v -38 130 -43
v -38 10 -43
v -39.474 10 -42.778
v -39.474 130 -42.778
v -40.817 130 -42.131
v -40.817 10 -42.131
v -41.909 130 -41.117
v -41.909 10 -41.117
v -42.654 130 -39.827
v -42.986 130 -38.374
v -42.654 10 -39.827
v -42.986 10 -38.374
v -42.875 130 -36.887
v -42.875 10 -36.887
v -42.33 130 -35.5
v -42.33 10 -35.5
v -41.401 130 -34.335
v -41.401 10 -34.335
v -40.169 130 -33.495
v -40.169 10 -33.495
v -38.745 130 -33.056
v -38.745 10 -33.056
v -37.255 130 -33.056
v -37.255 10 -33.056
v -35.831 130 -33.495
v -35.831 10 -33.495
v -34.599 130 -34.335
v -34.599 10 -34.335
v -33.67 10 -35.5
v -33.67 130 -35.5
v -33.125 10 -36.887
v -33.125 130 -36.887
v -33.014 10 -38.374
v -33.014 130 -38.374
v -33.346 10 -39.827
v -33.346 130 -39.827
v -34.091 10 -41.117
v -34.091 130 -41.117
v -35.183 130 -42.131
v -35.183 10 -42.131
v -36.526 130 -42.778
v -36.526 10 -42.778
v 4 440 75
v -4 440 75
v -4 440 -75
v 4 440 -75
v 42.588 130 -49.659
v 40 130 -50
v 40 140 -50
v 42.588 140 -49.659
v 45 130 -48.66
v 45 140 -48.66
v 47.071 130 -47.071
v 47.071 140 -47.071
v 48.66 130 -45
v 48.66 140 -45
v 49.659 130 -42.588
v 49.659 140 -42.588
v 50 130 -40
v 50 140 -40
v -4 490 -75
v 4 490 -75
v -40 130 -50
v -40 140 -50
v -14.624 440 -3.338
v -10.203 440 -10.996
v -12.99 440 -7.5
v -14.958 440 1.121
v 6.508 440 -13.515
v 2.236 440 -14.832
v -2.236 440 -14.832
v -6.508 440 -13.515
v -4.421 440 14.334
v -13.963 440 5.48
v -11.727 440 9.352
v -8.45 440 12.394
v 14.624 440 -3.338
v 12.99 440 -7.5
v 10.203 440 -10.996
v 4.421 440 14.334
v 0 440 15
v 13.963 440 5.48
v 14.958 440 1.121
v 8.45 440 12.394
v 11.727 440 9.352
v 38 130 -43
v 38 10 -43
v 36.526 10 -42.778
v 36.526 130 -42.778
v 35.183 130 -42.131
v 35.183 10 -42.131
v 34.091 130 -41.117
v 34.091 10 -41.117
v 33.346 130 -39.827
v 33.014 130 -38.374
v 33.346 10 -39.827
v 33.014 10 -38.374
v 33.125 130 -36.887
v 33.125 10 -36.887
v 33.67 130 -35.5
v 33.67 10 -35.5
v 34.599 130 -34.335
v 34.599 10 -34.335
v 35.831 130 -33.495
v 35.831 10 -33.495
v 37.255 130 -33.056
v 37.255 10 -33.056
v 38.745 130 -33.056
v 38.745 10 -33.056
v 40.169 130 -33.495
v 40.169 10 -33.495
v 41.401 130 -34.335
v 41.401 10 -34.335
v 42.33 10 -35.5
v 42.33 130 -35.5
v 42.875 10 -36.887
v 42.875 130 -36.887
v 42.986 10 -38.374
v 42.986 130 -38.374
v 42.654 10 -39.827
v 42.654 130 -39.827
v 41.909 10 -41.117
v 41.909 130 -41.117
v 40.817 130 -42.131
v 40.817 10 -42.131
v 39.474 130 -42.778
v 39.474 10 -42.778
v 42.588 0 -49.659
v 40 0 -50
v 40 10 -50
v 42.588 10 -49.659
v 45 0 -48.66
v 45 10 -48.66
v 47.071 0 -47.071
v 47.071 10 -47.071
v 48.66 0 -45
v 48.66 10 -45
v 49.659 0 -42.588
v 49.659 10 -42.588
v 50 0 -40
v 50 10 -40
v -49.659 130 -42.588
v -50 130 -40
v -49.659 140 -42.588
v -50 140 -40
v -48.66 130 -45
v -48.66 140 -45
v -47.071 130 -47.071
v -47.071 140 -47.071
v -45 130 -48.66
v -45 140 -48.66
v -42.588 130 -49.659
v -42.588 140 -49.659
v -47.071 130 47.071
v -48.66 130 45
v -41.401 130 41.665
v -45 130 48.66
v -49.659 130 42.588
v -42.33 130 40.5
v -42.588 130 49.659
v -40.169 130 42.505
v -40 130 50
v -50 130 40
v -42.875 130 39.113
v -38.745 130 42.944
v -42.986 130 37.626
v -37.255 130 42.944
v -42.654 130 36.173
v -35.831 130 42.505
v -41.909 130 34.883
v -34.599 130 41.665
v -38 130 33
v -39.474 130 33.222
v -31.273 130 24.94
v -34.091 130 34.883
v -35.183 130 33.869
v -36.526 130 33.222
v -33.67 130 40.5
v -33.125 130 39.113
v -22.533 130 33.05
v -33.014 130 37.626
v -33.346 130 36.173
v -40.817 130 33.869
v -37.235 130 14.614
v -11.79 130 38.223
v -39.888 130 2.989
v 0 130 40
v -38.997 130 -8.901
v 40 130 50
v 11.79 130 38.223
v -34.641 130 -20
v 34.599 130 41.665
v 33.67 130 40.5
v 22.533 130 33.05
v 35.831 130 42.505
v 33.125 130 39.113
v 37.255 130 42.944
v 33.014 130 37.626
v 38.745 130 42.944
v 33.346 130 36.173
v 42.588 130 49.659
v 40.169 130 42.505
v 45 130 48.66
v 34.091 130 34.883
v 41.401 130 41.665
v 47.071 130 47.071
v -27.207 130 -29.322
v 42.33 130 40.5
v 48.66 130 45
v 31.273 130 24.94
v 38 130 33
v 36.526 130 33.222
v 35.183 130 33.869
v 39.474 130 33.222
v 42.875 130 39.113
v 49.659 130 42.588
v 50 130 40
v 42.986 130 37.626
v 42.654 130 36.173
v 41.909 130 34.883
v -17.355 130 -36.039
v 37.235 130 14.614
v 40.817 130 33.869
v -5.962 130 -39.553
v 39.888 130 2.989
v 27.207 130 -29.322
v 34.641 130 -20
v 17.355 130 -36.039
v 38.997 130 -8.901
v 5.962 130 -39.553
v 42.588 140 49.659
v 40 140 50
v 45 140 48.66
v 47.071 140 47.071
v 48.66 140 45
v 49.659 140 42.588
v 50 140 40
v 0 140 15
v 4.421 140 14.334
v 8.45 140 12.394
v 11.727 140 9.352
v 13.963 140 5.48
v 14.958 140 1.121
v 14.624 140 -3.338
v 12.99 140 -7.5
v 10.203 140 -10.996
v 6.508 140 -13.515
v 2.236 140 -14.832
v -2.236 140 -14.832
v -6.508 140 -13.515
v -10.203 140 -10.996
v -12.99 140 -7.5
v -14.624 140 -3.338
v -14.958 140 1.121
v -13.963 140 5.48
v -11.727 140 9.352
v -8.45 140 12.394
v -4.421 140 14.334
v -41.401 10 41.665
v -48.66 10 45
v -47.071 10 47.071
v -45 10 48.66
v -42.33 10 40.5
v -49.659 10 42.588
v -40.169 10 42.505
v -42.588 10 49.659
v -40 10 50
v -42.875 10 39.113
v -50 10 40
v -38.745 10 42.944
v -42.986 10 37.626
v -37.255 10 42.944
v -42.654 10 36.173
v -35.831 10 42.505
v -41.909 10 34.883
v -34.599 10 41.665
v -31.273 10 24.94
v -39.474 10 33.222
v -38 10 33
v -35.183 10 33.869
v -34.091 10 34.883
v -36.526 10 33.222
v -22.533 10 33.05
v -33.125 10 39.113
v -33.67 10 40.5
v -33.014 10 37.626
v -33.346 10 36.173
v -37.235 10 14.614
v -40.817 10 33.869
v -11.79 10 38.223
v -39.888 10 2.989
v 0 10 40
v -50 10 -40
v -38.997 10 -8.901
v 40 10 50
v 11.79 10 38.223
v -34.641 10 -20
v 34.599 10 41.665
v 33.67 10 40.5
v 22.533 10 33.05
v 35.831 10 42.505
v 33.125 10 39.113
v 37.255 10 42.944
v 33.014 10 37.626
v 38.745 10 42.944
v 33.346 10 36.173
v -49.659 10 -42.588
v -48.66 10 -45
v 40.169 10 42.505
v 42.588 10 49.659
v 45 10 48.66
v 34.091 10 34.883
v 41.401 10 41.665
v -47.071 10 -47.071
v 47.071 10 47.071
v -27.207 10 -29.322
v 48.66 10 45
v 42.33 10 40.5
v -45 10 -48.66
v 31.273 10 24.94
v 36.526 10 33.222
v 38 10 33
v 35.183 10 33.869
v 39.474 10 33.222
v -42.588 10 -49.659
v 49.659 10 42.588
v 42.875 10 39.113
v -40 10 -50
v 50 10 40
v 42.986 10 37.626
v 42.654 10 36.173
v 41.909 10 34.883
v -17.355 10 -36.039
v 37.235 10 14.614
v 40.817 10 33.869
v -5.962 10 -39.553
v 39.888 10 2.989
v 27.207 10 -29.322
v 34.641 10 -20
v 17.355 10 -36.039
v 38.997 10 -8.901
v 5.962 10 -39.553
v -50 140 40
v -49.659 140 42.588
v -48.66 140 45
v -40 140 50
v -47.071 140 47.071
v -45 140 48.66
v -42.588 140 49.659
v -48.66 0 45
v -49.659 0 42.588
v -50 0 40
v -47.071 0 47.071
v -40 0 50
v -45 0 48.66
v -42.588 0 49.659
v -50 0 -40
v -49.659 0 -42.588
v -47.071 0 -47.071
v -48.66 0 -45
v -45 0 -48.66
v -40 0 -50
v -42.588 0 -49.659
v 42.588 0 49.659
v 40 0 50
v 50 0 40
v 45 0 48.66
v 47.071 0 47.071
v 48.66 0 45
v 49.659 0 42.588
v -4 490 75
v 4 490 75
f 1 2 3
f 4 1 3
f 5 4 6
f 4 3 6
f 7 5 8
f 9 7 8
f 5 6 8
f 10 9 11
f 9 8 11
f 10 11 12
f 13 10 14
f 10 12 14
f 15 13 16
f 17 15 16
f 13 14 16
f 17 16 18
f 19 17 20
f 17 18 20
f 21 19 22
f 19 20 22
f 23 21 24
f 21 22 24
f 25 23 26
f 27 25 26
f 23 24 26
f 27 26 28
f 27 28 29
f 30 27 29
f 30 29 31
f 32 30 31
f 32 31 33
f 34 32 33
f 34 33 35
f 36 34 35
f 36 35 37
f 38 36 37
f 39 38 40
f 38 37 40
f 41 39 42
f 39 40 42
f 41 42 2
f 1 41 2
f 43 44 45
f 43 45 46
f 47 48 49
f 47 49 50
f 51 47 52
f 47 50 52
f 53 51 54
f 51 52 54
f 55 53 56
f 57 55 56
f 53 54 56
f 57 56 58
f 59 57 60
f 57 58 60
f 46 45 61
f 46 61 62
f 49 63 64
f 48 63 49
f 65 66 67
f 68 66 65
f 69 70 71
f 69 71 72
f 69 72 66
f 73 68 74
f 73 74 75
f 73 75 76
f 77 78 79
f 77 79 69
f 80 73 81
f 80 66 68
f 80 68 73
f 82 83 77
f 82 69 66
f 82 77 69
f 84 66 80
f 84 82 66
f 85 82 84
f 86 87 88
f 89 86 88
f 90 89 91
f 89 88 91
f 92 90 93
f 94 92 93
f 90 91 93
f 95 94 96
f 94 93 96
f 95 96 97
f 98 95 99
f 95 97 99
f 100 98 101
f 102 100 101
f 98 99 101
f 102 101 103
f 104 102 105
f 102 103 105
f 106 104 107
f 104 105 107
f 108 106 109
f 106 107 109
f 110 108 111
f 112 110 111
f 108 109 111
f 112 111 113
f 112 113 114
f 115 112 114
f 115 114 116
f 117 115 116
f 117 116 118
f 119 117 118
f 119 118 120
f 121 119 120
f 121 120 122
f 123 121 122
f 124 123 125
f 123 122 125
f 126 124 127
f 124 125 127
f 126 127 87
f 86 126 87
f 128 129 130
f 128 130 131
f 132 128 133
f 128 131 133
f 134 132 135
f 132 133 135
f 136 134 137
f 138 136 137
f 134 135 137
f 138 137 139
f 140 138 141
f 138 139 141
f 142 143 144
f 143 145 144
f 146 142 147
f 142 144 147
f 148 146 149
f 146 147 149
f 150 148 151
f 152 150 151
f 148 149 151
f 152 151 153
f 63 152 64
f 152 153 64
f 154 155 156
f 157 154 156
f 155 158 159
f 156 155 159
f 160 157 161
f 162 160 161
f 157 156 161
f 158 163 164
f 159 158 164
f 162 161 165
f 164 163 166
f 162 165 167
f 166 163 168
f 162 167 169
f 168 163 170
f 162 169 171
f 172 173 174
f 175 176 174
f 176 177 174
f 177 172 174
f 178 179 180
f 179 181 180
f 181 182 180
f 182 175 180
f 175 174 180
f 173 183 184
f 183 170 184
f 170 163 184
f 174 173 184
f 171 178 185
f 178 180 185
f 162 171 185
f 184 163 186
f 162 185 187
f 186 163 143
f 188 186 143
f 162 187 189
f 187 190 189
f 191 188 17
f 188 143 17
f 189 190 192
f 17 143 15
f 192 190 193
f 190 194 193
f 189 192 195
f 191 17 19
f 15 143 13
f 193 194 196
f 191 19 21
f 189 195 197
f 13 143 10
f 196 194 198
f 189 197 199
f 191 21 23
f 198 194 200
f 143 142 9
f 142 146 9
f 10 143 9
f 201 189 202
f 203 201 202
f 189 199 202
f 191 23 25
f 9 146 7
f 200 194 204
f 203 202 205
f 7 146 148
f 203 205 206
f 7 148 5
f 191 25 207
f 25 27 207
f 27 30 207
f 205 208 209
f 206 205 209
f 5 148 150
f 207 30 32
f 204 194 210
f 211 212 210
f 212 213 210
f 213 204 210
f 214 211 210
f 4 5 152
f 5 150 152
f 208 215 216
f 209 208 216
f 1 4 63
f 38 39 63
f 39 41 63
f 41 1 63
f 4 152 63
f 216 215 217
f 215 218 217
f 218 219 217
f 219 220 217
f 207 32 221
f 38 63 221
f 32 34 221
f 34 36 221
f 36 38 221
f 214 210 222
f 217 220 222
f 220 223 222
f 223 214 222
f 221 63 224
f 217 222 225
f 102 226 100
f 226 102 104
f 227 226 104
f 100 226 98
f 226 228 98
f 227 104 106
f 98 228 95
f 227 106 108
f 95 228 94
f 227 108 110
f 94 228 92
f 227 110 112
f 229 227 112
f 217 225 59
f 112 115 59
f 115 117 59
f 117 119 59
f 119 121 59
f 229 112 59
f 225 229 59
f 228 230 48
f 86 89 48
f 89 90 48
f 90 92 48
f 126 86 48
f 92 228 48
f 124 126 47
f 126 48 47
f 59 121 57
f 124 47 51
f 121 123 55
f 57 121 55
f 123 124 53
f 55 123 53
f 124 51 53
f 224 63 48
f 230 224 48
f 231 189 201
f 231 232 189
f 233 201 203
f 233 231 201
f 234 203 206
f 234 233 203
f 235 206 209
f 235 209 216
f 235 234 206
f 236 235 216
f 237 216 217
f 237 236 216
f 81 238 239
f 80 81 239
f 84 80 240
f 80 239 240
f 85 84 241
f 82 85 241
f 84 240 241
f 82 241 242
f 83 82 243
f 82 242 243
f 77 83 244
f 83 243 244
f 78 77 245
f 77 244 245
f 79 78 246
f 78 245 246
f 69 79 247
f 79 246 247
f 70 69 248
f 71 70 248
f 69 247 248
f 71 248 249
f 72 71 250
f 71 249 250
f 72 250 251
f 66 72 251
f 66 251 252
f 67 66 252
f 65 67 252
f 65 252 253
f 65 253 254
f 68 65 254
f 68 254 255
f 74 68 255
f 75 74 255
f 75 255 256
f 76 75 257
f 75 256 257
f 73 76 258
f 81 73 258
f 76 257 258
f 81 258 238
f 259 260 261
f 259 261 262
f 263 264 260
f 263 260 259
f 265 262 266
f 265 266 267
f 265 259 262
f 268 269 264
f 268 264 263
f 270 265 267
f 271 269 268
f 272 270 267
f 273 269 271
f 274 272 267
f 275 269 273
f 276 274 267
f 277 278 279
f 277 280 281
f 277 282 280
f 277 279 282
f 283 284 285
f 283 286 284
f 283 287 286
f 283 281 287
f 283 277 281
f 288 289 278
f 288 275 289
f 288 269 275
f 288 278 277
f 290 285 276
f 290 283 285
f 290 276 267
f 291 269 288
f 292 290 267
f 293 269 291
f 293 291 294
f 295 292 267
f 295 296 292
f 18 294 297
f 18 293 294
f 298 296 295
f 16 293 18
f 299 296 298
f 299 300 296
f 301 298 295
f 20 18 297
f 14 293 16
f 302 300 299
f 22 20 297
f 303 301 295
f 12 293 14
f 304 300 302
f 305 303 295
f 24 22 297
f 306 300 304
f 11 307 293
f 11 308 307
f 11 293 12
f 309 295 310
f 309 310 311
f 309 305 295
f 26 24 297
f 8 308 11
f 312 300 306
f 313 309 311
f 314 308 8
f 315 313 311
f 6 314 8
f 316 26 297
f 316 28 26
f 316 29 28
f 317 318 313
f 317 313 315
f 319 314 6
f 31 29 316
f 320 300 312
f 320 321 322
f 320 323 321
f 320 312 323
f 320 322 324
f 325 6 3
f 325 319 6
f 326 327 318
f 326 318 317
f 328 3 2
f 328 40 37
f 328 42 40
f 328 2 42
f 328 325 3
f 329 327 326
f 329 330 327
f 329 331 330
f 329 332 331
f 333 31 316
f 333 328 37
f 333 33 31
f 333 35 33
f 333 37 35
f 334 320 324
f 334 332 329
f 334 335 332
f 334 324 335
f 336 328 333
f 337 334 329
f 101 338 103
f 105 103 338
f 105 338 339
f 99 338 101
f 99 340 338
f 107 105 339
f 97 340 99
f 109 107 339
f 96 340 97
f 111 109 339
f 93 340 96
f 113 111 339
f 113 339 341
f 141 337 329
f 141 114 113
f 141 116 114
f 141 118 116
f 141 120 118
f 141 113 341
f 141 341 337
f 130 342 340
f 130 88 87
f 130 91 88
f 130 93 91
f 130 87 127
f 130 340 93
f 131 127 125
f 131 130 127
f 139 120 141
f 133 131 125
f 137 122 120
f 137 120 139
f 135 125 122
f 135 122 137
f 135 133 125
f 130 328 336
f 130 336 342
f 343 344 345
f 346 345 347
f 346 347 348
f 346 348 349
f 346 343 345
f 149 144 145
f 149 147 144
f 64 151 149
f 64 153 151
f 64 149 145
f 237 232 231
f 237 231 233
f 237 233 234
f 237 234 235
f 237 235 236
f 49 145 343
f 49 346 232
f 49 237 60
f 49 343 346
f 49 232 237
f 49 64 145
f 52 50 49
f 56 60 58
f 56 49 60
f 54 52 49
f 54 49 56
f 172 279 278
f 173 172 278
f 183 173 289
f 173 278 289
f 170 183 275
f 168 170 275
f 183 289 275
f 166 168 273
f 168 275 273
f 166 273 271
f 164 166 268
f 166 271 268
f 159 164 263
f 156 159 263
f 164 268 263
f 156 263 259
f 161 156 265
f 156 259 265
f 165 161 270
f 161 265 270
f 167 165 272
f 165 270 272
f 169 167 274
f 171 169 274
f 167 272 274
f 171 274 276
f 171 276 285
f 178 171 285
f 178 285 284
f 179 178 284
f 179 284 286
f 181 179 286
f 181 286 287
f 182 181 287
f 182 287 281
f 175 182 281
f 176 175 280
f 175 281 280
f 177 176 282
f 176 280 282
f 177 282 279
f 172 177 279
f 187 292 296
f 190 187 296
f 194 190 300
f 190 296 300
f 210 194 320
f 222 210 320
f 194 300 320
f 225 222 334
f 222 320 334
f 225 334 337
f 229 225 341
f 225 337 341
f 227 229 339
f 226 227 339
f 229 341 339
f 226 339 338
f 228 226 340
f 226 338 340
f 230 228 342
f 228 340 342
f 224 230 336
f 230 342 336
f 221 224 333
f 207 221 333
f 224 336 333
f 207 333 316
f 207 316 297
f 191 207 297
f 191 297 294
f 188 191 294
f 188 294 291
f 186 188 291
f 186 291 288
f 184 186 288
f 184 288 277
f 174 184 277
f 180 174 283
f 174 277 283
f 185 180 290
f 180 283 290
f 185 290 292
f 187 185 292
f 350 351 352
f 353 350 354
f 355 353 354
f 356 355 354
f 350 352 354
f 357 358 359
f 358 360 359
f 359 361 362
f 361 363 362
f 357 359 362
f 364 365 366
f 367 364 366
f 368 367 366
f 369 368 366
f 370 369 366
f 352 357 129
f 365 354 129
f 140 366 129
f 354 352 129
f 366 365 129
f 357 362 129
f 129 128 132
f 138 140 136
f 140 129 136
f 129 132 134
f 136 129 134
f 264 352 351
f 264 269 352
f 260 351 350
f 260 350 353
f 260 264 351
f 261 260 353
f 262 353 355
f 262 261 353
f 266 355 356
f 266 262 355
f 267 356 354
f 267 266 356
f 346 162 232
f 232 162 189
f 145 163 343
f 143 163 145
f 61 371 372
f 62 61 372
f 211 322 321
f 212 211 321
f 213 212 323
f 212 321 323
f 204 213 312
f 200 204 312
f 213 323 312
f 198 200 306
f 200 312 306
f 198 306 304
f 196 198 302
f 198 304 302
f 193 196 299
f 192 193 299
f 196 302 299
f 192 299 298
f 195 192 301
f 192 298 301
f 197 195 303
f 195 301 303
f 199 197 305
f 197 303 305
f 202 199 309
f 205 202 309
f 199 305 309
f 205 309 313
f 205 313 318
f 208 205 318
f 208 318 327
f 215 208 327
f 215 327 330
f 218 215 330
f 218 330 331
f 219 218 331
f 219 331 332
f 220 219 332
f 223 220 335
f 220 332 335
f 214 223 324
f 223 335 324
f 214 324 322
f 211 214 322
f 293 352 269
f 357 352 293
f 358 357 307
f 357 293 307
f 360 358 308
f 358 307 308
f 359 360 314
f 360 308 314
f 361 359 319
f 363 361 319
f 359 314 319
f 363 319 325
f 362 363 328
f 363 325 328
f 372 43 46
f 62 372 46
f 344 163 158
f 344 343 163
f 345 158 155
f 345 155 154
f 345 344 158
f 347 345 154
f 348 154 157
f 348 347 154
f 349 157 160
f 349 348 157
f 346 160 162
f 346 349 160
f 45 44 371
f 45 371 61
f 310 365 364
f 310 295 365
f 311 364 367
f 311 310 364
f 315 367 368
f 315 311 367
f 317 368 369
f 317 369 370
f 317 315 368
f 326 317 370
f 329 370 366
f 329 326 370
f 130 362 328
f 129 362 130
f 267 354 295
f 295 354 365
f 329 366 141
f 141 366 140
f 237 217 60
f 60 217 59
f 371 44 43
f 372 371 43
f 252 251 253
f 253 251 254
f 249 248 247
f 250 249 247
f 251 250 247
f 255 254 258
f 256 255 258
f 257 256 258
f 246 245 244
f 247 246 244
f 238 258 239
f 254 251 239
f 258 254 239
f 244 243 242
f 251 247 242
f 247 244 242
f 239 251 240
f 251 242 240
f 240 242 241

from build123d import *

# Parameters (mm, degrees)
SKETCH1_W           = 100
SKETCH1_H           = 100
BOSS_EXTRUDE1_DEPTH = 10
SKETCH2_R           = 40
BOSS_EXTRUDE2_DEPTH = 120
SKETCH3_W           = 100
SKETCH3_H           = 100
BOSS_EXTRUDE3_DEPTH = 10
SKETCH4_R           = 15
BOSS_EXTRUDE4_DEPTH = 300
SKETCH5_R           = 5
BOSS_EXTRUDE5_DEPTH = 120
FILLET1_R           = 10
SKETCH6_W           = 8
SKETCH6_H           = 150
BOSS_EXTRUDE6_DEPTH = 50


with BuildPart() as part:
    # Sketch1 → Boss-Extrude1 (new body)
    with BuildSketch(Plane(origin=(0, 0, 0), x_dir=(1, 0, 0), z_dir=(0, 1, 0))):
        Rectangle(SKETCH1_W, SKETCH1_H)
    extrude(amount=BOSS_EXTRUDE1_DEPTH)



with BuildPart() as body_2:
    # Sketch2 → Boss-Extrude2 (new body)
    with BuildSketch(Plane(origin=(0, 10, 0), x_dir=(1, 0, 0), z_dir=(0, 1, 0))):
        with Locations(Location((0, 0, 0), (0, 0, 270))):
            Circle(SKETCH2_R)
    extrude(amount=BOSS_EXTRUDE2_DEPTH)


with BuildPart() as body_3:
    # Sketch3 → Boss-Extrude3 (new body)
    with BuildSketch(Plane(origin=(0, 130, 0), x_dir=(1, 0, 0), z_dir=(0, 1, 0))):
        Rectangle(SKETCH3_W, SKETCH3_H)
    extrude(amount=BOSS_EXTRUDE3_DEPTH)


with BuildPart() as body_4:
    # Sketch4 → Boss-Extrude4 (new body)
    with BuildSketch(Plane(origin=(0, 140, 0), x_dir=(1, 0, 0), z_dir=(0, 1, 0))):
        with Locations(Location((0, 0, 0), (0, 0, 270))):
            Circle(SKETCH4_R)
    extrude(amount=BOSS_EXTRUDE4_DEPTH)


with BuildPart() as part_1:
    add(part.part)

    add(body_2.part)  # Boss-Extrude5 merges body 2

    add(body_3.part)  # Boss-Extrude5 merges body 3
    # Sketch5 → Boss-Extrude5 (add)
    with BuildSketch(Plane(origin=(0, 10, 0), x_dir=(1, 0, 0), z_dir=(0, 1, 0))):
        with Locations(Location((-38, 38, 0), (0, 0, 90))):
            Circle(SKETCH5_R)
        with Locations(Location((38, 38, 0), (0, 0, 90))):
            Circle(SKETCH5_R)
        with Locations(Location((38, -38, 0), (0, 0, 90))):
            Circle(SKETCH5_R)
        with Locations(Location((-38, -38, 0), (0, 0, 90))):
            Circle(SKETCH5_R)
    extrude(amount=BOSS_EXTRUDE5_DEPTH)

    # Fillet1
    fillet1_edges = [part_1.edges().sort_by_distance(p)[0] for p in [
        (-50, 135, -50),
        (-50, 135, 50),
        (50, 135, 50),
        (50, 135, -50),
        (50, 5, 50),
        (-50, 5, 50),
        (-50, 5, -50),
        (50, 5, -50),
    ]]
    fillet(fillet1_edges, radius=FILLET1_R)


with BuildPart() as body_3_2:
    # Sketch6 → Boss-Extrude6 (new body)
    with BuildSketch(Plane(origin=(0, 440, 0), x_dir=(1, 0, 0), z_dir=(0, 1, 0))):
        Rectangle(SKETCH6_W, SKETCH6_H)
    extrude(amount=BOSS_EXTRUDE6_DEPTH)


solid = Compound([body_4.part, part_1.part, body_3_2.part])
